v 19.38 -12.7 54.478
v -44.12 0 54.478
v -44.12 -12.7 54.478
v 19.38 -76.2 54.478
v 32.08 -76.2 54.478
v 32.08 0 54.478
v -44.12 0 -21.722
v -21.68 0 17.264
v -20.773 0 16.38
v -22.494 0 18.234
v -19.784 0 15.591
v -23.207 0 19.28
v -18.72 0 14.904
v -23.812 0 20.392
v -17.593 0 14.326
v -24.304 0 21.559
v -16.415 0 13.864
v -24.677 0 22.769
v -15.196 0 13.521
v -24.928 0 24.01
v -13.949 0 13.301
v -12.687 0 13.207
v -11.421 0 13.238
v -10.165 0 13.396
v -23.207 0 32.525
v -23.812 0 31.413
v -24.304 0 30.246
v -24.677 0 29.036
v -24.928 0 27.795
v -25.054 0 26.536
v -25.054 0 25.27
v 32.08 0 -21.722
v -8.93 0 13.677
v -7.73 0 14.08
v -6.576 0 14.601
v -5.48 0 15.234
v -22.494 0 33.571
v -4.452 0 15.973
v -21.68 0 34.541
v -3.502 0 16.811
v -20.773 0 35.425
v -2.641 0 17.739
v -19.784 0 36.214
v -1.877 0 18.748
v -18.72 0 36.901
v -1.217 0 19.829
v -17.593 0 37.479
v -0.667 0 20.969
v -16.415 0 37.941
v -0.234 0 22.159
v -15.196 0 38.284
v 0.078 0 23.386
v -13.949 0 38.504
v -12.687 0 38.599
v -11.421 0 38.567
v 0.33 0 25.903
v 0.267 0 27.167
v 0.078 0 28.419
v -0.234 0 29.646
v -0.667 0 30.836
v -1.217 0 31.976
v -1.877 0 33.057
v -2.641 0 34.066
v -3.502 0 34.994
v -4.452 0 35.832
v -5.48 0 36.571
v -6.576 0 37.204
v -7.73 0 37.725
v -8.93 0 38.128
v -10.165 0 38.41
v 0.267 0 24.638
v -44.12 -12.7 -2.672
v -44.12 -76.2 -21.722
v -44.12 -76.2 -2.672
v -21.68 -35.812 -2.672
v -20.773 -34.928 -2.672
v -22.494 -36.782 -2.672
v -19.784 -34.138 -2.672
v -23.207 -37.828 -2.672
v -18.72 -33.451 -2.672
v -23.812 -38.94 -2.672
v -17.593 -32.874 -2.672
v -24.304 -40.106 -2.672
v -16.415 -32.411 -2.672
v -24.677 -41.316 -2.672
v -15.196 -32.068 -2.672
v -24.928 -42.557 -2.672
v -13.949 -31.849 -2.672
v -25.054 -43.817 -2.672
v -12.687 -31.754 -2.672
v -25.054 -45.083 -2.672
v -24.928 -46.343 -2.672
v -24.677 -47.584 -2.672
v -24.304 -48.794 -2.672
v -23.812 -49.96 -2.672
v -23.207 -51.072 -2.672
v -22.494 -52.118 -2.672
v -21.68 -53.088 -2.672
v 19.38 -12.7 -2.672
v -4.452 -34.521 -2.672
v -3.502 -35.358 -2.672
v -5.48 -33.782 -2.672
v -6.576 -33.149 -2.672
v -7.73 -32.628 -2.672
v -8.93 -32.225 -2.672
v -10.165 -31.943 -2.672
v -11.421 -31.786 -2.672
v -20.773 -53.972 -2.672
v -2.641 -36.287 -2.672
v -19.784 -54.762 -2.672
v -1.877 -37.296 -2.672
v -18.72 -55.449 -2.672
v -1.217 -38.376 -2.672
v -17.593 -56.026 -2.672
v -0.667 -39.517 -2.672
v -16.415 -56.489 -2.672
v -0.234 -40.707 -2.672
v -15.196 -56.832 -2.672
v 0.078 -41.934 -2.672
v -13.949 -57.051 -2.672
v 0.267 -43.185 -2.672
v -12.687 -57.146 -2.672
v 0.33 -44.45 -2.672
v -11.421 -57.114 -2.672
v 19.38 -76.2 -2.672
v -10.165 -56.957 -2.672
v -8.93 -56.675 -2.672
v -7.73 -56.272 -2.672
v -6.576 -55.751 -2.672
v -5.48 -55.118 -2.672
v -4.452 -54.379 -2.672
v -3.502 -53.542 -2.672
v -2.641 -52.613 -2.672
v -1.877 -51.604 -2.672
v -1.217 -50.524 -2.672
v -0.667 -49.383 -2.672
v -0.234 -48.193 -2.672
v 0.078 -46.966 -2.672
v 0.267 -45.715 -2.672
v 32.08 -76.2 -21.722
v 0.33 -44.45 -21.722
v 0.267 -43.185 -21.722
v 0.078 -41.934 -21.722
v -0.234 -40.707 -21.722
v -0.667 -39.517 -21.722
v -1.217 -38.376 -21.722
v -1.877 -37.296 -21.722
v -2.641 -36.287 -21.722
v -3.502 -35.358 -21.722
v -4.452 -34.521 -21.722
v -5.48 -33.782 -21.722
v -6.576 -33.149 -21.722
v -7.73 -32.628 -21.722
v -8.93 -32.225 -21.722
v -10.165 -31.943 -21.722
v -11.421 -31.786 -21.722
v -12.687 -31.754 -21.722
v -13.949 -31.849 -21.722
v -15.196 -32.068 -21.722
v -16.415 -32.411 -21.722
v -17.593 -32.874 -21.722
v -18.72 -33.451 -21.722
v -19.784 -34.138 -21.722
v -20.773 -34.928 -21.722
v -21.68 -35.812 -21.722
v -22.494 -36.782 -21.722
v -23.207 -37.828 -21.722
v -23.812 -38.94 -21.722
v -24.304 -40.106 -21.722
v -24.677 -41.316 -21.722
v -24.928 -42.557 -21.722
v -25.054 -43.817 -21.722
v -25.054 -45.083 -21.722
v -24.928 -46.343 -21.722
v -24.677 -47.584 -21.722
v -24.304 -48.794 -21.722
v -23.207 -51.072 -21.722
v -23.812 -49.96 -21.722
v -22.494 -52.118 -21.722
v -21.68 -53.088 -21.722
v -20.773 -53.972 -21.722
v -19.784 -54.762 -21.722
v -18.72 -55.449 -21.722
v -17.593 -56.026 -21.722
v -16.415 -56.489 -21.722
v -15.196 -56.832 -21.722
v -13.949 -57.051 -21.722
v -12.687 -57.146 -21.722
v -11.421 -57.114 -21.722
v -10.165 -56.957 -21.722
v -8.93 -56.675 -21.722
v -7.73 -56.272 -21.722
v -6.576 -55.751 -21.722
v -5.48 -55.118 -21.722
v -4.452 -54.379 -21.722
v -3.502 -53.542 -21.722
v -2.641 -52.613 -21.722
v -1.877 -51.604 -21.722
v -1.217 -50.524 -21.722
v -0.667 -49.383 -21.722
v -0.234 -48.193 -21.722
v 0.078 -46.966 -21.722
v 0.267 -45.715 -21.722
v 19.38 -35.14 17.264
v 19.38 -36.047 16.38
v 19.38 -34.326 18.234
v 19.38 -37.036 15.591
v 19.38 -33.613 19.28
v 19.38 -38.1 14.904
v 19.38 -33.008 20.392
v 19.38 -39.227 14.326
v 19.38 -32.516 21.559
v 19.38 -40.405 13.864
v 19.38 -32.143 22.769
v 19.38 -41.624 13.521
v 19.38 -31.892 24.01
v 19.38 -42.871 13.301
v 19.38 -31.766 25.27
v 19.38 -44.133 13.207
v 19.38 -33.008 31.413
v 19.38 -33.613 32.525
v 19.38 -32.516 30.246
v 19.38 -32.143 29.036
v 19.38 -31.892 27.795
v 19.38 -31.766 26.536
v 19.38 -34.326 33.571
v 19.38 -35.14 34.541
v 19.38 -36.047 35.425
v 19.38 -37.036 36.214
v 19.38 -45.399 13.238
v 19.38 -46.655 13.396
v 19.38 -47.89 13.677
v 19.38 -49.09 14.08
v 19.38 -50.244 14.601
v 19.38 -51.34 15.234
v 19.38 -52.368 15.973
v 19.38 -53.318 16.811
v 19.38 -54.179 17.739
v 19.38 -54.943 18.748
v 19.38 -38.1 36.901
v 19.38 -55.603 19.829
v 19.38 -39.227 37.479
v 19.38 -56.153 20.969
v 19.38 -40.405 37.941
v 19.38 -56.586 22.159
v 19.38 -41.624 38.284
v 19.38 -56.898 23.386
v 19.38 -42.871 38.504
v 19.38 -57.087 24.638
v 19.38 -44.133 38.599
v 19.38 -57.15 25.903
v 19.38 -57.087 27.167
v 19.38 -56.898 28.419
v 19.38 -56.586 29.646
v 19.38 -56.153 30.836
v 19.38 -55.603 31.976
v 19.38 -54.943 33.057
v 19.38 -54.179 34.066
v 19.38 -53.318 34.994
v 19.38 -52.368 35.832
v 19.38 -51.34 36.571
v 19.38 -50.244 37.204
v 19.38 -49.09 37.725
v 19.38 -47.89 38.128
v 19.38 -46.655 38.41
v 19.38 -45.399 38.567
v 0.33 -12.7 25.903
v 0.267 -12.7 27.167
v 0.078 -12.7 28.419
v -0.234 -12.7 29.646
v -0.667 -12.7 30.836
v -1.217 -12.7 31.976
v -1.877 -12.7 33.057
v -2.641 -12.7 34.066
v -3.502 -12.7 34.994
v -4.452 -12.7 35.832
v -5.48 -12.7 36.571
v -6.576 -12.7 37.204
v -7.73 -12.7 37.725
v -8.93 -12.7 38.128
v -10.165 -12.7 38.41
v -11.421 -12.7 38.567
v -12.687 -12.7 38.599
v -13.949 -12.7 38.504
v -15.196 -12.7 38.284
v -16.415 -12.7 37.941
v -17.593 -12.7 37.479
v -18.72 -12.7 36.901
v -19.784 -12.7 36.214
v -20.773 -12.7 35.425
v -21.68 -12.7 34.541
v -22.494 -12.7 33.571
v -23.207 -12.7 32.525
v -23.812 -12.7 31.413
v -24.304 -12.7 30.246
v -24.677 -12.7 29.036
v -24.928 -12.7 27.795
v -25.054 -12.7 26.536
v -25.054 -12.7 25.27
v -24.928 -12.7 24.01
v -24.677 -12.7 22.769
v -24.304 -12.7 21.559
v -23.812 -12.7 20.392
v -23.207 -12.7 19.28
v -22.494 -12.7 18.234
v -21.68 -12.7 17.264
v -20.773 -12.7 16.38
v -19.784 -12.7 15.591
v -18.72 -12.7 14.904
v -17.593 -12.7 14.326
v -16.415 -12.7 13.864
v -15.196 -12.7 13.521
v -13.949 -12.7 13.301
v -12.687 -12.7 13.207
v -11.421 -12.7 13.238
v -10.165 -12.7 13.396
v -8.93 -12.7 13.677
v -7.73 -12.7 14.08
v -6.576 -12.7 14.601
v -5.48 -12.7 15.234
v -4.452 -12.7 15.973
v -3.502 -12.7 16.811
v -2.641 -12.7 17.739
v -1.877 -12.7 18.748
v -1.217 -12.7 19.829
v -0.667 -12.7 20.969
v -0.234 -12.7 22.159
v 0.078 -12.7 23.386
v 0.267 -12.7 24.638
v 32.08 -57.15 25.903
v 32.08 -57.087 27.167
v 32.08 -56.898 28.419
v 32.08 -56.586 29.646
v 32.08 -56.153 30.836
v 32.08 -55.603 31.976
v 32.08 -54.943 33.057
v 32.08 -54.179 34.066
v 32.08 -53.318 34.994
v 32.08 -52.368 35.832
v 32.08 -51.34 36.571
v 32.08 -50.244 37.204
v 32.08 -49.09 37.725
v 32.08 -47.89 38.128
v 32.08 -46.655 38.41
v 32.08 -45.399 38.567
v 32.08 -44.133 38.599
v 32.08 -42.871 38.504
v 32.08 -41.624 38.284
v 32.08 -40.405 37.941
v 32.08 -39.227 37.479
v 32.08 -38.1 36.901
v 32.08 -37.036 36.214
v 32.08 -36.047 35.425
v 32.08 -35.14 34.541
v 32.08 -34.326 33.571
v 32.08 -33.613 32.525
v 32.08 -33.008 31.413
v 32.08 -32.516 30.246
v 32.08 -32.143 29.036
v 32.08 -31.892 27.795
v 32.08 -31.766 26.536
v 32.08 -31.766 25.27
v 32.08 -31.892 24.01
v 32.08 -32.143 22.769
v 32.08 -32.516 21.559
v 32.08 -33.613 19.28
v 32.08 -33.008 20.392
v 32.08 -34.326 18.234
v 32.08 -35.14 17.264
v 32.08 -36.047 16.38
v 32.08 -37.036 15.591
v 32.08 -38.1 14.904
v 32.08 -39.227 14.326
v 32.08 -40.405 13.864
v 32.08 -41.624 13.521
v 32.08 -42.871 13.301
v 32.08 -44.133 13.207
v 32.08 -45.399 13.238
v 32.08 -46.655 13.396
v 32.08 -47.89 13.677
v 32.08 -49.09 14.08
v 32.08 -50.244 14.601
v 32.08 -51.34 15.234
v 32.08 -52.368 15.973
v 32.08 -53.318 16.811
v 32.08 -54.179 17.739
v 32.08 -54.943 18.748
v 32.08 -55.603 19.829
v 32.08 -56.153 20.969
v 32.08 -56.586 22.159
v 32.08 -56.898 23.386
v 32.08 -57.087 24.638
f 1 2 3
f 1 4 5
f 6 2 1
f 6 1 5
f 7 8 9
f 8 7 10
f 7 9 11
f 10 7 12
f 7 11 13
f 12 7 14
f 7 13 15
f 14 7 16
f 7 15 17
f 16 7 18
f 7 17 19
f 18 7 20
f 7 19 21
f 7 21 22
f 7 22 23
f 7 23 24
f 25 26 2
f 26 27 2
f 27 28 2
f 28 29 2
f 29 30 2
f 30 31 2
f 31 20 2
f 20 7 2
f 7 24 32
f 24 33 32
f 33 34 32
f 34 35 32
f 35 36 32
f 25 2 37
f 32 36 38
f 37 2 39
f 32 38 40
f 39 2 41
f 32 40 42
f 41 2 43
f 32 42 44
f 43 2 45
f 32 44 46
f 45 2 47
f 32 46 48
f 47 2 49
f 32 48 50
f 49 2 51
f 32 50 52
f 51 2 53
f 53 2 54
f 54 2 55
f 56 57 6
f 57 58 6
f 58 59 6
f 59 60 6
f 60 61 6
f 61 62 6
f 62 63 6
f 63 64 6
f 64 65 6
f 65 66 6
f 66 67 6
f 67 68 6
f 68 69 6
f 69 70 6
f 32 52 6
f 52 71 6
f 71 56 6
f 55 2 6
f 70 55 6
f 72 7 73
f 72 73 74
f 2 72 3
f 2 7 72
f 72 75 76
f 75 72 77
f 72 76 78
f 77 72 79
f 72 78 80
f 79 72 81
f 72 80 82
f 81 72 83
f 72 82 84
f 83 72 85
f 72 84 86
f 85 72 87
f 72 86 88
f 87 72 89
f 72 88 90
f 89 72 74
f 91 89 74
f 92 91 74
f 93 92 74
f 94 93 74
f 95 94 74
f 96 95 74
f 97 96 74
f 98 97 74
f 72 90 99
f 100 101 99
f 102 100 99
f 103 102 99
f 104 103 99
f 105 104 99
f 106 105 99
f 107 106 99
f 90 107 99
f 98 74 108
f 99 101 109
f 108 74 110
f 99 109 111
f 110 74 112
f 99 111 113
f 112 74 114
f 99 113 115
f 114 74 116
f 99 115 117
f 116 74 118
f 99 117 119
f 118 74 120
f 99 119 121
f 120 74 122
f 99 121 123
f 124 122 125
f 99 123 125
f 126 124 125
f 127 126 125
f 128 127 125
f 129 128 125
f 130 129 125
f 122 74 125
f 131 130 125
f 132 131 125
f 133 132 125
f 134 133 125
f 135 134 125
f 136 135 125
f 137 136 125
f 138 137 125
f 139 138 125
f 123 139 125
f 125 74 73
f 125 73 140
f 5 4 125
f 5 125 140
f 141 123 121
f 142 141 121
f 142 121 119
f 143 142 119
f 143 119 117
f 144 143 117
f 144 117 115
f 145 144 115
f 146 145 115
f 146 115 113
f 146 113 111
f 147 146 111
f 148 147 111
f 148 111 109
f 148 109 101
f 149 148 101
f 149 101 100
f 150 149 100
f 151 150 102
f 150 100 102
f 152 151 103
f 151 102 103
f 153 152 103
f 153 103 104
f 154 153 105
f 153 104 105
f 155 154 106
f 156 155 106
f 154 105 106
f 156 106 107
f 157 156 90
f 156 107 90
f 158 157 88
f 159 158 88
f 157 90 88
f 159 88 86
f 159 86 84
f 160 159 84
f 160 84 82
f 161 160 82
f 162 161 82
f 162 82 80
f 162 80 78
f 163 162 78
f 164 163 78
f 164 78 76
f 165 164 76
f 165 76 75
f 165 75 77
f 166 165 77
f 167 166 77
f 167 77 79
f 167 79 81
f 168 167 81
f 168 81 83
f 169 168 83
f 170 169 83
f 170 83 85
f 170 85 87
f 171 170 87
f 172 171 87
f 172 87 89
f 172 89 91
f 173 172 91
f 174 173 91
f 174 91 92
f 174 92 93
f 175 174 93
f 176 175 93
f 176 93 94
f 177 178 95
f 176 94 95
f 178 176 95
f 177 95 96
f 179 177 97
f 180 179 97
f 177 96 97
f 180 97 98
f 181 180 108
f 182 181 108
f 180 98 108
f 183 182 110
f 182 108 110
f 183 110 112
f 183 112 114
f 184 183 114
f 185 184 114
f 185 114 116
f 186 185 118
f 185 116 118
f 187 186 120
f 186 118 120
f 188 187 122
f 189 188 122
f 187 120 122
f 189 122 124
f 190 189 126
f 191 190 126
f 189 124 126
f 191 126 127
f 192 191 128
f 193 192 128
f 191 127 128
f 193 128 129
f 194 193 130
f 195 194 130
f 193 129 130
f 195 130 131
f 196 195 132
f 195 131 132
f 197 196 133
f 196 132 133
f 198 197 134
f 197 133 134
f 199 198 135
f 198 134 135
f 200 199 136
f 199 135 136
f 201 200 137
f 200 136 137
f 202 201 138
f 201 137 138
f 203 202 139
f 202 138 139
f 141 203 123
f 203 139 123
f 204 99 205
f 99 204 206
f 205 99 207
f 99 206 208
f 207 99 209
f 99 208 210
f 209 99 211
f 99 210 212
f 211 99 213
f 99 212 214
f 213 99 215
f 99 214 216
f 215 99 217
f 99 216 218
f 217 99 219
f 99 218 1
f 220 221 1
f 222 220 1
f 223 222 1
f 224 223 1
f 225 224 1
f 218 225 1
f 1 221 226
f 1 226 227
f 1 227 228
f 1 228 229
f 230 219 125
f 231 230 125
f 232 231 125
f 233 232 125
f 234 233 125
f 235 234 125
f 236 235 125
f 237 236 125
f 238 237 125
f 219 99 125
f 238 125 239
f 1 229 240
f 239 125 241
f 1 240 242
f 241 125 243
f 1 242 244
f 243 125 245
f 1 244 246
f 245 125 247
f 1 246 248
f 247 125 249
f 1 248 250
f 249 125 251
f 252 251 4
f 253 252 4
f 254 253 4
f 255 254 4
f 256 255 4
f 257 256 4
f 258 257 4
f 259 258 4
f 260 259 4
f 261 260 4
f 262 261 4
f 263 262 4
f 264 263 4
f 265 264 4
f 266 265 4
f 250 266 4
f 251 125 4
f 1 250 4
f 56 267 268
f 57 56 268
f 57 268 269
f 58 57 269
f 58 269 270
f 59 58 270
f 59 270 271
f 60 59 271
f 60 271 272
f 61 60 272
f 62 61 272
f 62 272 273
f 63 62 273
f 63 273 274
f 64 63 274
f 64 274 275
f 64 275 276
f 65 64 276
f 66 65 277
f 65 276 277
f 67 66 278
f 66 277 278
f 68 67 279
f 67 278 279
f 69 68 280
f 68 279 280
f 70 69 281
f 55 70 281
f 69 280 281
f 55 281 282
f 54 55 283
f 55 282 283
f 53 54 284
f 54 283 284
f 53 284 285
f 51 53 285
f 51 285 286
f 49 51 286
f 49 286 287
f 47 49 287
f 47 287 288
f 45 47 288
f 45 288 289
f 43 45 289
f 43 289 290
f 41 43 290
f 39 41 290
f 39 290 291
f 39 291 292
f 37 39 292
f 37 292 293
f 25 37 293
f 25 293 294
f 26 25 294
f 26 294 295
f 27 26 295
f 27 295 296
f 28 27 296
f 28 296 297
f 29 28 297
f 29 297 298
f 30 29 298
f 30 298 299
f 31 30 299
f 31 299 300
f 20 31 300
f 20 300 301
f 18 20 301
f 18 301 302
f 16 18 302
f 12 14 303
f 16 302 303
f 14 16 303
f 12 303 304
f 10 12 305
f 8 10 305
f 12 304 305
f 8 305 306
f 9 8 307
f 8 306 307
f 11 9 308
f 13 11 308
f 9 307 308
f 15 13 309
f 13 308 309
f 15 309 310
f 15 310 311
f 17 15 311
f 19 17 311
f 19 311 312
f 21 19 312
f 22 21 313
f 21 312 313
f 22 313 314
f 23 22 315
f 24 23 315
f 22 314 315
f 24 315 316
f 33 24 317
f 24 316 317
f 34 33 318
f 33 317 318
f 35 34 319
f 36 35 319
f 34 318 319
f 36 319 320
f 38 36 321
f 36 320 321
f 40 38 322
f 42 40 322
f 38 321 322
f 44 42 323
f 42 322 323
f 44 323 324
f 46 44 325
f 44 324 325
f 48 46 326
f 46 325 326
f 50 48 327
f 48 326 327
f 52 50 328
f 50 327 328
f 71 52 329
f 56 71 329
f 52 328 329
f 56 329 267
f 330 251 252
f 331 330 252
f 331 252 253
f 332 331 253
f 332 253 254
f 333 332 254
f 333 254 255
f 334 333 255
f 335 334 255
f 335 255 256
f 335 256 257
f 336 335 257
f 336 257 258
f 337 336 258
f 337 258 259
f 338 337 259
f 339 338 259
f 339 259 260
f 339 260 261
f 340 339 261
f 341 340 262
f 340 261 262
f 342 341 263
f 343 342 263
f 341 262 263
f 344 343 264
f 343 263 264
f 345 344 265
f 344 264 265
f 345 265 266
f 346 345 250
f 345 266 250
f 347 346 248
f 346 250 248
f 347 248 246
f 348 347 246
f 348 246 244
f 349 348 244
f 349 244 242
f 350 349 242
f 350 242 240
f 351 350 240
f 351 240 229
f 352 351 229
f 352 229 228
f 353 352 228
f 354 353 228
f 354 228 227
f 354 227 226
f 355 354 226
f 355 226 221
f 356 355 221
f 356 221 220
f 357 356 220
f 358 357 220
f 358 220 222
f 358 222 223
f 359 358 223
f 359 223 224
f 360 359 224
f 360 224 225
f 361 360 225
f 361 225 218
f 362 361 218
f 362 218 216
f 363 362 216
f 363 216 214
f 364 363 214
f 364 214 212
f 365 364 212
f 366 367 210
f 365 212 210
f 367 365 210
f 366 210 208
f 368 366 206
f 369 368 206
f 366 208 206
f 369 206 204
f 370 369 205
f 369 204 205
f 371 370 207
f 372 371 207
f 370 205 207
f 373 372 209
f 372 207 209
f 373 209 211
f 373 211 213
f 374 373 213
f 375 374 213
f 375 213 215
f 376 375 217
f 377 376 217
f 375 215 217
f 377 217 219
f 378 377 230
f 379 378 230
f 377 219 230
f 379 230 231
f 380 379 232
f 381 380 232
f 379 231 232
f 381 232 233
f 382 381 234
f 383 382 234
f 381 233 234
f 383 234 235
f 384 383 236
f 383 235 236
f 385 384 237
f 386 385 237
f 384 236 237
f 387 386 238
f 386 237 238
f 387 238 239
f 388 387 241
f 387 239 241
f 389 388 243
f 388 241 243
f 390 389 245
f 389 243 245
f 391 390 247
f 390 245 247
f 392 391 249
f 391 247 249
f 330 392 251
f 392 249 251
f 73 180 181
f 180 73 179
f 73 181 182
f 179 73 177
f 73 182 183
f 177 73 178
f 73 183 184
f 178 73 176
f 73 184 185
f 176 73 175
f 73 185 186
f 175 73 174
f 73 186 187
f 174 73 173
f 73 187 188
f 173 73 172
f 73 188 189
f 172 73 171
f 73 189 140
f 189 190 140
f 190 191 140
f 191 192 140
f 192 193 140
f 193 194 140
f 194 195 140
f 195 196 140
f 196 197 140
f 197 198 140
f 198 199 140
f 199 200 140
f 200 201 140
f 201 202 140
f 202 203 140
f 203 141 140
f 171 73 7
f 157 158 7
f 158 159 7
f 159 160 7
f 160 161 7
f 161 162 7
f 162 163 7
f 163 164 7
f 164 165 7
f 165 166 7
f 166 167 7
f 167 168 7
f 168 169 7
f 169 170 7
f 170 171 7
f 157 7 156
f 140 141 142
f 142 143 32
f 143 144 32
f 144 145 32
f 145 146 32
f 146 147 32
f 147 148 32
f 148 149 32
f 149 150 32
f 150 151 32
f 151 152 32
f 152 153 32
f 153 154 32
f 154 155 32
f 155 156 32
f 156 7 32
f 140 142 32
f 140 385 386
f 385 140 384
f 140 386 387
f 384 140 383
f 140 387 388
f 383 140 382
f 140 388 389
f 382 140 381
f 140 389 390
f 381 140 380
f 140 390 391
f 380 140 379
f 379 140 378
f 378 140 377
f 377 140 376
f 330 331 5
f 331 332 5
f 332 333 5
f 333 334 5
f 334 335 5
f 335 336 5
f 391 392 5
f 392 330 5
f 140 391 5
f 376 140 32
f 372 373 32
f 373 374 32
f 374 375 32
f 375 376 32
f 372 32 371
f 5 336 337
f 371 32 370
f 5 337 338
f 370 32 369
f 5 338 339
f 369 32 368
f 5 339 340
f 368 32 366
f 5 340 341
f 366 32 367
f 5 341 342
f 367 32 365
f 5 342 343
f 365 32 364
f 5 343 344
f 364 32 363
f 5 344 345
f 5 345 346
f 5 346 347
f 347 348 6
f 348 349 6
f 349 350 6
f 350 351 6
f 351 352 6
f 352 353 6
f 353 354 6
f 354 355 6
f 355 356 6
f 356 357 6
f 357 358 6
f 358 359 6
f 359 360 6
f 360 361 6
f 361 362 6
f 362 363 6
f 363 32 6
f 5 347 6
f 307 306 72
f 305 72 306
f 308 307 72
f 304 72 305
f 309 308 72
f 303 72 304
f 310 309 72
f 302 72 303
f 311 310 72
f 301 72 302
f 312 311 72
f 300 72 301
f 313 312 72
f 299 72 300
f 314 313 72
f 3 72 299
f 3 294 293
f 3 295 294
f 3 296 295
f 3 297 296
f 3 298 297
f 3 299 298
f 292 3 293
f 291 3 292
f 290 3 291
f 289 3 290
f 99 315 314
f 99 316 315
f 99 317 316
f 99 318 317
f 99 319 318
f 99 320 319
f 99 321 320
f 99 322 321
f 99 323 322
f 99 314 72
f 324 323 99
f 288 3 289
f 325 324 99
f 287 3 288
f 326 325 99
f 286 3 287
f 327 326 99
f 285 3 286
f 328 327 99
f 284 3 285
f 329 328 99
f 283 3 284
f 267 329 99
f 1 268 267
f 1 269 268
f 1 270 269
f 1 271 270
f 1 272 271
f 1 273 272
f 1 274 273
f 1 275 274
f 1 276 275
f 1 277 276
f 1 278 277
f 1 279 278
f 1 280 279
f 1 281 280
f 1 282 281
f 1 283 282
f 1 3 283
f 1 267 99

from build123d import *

# Parameters (mm, degrees)
F0_W     = 76.2
F0_H     = 76.2
F1_DEPTH = 76.2
F2_W     = 63.5
F2_H     = 57.15
F3_DEPTH = 63.5
F5_R     = 12.7
F7_DEPTH = 25.4
F6_R     = 12.7
F8_DEPTH = 25.4
F4_R     = 12.7
F9_DEPTH = 25.4


with BuildPart() as f1:
    # F0 (on Front) → F1 (new body)
    with BuildSketch(Plane.XZ):
        with Locations((-6.020044, 16.377596)):
            Rectangle(F0_W, F0_H)
    extrude(amount=F1_DEPTH)

    # F2 (on face) → F3 (cut)
    with BuildSketch(Plane.XZ.offset(76.2)):
        with Locations((-12.370044, 25.902596)):
            Rectangle(F2_W, F2_H)
    extrude(amount=-F3_DEPTH, mode=Mode.SUBTRACT)

    # F5 (on face) → F7 (cut)
    with BuildSketch(Plane(origin=(19.379956, 0, 0), x_dir=(0, -1, 0), z_dir=(-1, 0, 0))):
        with Locations((44.45, 25.902596)):
            Circle(F5_R)
    extrude(amount=-F7_DEPTH, mode=Mode.SUBTRACT)

    # F6 (on face) → F8 (cut)
    with BuildSketch(Plane.XZ.offset(12.7)):
        with Locations((-12.370044, 25.902596)):
            Circle(F6_R)
    extrude(amount=-F8_DEPTH, mode=Mode.SUBTRACT)

    # F4 (on face) → F9 (cut)
    with BuildSketch(Plane.XY.offset(-2.672404)):
        with Locations((-12.370044, -44.45)):
            Circle(F4_R)
    extrude(amount=-F9_DEPTH, mode=Mode.SUBTRACT)


solid = f1.part
